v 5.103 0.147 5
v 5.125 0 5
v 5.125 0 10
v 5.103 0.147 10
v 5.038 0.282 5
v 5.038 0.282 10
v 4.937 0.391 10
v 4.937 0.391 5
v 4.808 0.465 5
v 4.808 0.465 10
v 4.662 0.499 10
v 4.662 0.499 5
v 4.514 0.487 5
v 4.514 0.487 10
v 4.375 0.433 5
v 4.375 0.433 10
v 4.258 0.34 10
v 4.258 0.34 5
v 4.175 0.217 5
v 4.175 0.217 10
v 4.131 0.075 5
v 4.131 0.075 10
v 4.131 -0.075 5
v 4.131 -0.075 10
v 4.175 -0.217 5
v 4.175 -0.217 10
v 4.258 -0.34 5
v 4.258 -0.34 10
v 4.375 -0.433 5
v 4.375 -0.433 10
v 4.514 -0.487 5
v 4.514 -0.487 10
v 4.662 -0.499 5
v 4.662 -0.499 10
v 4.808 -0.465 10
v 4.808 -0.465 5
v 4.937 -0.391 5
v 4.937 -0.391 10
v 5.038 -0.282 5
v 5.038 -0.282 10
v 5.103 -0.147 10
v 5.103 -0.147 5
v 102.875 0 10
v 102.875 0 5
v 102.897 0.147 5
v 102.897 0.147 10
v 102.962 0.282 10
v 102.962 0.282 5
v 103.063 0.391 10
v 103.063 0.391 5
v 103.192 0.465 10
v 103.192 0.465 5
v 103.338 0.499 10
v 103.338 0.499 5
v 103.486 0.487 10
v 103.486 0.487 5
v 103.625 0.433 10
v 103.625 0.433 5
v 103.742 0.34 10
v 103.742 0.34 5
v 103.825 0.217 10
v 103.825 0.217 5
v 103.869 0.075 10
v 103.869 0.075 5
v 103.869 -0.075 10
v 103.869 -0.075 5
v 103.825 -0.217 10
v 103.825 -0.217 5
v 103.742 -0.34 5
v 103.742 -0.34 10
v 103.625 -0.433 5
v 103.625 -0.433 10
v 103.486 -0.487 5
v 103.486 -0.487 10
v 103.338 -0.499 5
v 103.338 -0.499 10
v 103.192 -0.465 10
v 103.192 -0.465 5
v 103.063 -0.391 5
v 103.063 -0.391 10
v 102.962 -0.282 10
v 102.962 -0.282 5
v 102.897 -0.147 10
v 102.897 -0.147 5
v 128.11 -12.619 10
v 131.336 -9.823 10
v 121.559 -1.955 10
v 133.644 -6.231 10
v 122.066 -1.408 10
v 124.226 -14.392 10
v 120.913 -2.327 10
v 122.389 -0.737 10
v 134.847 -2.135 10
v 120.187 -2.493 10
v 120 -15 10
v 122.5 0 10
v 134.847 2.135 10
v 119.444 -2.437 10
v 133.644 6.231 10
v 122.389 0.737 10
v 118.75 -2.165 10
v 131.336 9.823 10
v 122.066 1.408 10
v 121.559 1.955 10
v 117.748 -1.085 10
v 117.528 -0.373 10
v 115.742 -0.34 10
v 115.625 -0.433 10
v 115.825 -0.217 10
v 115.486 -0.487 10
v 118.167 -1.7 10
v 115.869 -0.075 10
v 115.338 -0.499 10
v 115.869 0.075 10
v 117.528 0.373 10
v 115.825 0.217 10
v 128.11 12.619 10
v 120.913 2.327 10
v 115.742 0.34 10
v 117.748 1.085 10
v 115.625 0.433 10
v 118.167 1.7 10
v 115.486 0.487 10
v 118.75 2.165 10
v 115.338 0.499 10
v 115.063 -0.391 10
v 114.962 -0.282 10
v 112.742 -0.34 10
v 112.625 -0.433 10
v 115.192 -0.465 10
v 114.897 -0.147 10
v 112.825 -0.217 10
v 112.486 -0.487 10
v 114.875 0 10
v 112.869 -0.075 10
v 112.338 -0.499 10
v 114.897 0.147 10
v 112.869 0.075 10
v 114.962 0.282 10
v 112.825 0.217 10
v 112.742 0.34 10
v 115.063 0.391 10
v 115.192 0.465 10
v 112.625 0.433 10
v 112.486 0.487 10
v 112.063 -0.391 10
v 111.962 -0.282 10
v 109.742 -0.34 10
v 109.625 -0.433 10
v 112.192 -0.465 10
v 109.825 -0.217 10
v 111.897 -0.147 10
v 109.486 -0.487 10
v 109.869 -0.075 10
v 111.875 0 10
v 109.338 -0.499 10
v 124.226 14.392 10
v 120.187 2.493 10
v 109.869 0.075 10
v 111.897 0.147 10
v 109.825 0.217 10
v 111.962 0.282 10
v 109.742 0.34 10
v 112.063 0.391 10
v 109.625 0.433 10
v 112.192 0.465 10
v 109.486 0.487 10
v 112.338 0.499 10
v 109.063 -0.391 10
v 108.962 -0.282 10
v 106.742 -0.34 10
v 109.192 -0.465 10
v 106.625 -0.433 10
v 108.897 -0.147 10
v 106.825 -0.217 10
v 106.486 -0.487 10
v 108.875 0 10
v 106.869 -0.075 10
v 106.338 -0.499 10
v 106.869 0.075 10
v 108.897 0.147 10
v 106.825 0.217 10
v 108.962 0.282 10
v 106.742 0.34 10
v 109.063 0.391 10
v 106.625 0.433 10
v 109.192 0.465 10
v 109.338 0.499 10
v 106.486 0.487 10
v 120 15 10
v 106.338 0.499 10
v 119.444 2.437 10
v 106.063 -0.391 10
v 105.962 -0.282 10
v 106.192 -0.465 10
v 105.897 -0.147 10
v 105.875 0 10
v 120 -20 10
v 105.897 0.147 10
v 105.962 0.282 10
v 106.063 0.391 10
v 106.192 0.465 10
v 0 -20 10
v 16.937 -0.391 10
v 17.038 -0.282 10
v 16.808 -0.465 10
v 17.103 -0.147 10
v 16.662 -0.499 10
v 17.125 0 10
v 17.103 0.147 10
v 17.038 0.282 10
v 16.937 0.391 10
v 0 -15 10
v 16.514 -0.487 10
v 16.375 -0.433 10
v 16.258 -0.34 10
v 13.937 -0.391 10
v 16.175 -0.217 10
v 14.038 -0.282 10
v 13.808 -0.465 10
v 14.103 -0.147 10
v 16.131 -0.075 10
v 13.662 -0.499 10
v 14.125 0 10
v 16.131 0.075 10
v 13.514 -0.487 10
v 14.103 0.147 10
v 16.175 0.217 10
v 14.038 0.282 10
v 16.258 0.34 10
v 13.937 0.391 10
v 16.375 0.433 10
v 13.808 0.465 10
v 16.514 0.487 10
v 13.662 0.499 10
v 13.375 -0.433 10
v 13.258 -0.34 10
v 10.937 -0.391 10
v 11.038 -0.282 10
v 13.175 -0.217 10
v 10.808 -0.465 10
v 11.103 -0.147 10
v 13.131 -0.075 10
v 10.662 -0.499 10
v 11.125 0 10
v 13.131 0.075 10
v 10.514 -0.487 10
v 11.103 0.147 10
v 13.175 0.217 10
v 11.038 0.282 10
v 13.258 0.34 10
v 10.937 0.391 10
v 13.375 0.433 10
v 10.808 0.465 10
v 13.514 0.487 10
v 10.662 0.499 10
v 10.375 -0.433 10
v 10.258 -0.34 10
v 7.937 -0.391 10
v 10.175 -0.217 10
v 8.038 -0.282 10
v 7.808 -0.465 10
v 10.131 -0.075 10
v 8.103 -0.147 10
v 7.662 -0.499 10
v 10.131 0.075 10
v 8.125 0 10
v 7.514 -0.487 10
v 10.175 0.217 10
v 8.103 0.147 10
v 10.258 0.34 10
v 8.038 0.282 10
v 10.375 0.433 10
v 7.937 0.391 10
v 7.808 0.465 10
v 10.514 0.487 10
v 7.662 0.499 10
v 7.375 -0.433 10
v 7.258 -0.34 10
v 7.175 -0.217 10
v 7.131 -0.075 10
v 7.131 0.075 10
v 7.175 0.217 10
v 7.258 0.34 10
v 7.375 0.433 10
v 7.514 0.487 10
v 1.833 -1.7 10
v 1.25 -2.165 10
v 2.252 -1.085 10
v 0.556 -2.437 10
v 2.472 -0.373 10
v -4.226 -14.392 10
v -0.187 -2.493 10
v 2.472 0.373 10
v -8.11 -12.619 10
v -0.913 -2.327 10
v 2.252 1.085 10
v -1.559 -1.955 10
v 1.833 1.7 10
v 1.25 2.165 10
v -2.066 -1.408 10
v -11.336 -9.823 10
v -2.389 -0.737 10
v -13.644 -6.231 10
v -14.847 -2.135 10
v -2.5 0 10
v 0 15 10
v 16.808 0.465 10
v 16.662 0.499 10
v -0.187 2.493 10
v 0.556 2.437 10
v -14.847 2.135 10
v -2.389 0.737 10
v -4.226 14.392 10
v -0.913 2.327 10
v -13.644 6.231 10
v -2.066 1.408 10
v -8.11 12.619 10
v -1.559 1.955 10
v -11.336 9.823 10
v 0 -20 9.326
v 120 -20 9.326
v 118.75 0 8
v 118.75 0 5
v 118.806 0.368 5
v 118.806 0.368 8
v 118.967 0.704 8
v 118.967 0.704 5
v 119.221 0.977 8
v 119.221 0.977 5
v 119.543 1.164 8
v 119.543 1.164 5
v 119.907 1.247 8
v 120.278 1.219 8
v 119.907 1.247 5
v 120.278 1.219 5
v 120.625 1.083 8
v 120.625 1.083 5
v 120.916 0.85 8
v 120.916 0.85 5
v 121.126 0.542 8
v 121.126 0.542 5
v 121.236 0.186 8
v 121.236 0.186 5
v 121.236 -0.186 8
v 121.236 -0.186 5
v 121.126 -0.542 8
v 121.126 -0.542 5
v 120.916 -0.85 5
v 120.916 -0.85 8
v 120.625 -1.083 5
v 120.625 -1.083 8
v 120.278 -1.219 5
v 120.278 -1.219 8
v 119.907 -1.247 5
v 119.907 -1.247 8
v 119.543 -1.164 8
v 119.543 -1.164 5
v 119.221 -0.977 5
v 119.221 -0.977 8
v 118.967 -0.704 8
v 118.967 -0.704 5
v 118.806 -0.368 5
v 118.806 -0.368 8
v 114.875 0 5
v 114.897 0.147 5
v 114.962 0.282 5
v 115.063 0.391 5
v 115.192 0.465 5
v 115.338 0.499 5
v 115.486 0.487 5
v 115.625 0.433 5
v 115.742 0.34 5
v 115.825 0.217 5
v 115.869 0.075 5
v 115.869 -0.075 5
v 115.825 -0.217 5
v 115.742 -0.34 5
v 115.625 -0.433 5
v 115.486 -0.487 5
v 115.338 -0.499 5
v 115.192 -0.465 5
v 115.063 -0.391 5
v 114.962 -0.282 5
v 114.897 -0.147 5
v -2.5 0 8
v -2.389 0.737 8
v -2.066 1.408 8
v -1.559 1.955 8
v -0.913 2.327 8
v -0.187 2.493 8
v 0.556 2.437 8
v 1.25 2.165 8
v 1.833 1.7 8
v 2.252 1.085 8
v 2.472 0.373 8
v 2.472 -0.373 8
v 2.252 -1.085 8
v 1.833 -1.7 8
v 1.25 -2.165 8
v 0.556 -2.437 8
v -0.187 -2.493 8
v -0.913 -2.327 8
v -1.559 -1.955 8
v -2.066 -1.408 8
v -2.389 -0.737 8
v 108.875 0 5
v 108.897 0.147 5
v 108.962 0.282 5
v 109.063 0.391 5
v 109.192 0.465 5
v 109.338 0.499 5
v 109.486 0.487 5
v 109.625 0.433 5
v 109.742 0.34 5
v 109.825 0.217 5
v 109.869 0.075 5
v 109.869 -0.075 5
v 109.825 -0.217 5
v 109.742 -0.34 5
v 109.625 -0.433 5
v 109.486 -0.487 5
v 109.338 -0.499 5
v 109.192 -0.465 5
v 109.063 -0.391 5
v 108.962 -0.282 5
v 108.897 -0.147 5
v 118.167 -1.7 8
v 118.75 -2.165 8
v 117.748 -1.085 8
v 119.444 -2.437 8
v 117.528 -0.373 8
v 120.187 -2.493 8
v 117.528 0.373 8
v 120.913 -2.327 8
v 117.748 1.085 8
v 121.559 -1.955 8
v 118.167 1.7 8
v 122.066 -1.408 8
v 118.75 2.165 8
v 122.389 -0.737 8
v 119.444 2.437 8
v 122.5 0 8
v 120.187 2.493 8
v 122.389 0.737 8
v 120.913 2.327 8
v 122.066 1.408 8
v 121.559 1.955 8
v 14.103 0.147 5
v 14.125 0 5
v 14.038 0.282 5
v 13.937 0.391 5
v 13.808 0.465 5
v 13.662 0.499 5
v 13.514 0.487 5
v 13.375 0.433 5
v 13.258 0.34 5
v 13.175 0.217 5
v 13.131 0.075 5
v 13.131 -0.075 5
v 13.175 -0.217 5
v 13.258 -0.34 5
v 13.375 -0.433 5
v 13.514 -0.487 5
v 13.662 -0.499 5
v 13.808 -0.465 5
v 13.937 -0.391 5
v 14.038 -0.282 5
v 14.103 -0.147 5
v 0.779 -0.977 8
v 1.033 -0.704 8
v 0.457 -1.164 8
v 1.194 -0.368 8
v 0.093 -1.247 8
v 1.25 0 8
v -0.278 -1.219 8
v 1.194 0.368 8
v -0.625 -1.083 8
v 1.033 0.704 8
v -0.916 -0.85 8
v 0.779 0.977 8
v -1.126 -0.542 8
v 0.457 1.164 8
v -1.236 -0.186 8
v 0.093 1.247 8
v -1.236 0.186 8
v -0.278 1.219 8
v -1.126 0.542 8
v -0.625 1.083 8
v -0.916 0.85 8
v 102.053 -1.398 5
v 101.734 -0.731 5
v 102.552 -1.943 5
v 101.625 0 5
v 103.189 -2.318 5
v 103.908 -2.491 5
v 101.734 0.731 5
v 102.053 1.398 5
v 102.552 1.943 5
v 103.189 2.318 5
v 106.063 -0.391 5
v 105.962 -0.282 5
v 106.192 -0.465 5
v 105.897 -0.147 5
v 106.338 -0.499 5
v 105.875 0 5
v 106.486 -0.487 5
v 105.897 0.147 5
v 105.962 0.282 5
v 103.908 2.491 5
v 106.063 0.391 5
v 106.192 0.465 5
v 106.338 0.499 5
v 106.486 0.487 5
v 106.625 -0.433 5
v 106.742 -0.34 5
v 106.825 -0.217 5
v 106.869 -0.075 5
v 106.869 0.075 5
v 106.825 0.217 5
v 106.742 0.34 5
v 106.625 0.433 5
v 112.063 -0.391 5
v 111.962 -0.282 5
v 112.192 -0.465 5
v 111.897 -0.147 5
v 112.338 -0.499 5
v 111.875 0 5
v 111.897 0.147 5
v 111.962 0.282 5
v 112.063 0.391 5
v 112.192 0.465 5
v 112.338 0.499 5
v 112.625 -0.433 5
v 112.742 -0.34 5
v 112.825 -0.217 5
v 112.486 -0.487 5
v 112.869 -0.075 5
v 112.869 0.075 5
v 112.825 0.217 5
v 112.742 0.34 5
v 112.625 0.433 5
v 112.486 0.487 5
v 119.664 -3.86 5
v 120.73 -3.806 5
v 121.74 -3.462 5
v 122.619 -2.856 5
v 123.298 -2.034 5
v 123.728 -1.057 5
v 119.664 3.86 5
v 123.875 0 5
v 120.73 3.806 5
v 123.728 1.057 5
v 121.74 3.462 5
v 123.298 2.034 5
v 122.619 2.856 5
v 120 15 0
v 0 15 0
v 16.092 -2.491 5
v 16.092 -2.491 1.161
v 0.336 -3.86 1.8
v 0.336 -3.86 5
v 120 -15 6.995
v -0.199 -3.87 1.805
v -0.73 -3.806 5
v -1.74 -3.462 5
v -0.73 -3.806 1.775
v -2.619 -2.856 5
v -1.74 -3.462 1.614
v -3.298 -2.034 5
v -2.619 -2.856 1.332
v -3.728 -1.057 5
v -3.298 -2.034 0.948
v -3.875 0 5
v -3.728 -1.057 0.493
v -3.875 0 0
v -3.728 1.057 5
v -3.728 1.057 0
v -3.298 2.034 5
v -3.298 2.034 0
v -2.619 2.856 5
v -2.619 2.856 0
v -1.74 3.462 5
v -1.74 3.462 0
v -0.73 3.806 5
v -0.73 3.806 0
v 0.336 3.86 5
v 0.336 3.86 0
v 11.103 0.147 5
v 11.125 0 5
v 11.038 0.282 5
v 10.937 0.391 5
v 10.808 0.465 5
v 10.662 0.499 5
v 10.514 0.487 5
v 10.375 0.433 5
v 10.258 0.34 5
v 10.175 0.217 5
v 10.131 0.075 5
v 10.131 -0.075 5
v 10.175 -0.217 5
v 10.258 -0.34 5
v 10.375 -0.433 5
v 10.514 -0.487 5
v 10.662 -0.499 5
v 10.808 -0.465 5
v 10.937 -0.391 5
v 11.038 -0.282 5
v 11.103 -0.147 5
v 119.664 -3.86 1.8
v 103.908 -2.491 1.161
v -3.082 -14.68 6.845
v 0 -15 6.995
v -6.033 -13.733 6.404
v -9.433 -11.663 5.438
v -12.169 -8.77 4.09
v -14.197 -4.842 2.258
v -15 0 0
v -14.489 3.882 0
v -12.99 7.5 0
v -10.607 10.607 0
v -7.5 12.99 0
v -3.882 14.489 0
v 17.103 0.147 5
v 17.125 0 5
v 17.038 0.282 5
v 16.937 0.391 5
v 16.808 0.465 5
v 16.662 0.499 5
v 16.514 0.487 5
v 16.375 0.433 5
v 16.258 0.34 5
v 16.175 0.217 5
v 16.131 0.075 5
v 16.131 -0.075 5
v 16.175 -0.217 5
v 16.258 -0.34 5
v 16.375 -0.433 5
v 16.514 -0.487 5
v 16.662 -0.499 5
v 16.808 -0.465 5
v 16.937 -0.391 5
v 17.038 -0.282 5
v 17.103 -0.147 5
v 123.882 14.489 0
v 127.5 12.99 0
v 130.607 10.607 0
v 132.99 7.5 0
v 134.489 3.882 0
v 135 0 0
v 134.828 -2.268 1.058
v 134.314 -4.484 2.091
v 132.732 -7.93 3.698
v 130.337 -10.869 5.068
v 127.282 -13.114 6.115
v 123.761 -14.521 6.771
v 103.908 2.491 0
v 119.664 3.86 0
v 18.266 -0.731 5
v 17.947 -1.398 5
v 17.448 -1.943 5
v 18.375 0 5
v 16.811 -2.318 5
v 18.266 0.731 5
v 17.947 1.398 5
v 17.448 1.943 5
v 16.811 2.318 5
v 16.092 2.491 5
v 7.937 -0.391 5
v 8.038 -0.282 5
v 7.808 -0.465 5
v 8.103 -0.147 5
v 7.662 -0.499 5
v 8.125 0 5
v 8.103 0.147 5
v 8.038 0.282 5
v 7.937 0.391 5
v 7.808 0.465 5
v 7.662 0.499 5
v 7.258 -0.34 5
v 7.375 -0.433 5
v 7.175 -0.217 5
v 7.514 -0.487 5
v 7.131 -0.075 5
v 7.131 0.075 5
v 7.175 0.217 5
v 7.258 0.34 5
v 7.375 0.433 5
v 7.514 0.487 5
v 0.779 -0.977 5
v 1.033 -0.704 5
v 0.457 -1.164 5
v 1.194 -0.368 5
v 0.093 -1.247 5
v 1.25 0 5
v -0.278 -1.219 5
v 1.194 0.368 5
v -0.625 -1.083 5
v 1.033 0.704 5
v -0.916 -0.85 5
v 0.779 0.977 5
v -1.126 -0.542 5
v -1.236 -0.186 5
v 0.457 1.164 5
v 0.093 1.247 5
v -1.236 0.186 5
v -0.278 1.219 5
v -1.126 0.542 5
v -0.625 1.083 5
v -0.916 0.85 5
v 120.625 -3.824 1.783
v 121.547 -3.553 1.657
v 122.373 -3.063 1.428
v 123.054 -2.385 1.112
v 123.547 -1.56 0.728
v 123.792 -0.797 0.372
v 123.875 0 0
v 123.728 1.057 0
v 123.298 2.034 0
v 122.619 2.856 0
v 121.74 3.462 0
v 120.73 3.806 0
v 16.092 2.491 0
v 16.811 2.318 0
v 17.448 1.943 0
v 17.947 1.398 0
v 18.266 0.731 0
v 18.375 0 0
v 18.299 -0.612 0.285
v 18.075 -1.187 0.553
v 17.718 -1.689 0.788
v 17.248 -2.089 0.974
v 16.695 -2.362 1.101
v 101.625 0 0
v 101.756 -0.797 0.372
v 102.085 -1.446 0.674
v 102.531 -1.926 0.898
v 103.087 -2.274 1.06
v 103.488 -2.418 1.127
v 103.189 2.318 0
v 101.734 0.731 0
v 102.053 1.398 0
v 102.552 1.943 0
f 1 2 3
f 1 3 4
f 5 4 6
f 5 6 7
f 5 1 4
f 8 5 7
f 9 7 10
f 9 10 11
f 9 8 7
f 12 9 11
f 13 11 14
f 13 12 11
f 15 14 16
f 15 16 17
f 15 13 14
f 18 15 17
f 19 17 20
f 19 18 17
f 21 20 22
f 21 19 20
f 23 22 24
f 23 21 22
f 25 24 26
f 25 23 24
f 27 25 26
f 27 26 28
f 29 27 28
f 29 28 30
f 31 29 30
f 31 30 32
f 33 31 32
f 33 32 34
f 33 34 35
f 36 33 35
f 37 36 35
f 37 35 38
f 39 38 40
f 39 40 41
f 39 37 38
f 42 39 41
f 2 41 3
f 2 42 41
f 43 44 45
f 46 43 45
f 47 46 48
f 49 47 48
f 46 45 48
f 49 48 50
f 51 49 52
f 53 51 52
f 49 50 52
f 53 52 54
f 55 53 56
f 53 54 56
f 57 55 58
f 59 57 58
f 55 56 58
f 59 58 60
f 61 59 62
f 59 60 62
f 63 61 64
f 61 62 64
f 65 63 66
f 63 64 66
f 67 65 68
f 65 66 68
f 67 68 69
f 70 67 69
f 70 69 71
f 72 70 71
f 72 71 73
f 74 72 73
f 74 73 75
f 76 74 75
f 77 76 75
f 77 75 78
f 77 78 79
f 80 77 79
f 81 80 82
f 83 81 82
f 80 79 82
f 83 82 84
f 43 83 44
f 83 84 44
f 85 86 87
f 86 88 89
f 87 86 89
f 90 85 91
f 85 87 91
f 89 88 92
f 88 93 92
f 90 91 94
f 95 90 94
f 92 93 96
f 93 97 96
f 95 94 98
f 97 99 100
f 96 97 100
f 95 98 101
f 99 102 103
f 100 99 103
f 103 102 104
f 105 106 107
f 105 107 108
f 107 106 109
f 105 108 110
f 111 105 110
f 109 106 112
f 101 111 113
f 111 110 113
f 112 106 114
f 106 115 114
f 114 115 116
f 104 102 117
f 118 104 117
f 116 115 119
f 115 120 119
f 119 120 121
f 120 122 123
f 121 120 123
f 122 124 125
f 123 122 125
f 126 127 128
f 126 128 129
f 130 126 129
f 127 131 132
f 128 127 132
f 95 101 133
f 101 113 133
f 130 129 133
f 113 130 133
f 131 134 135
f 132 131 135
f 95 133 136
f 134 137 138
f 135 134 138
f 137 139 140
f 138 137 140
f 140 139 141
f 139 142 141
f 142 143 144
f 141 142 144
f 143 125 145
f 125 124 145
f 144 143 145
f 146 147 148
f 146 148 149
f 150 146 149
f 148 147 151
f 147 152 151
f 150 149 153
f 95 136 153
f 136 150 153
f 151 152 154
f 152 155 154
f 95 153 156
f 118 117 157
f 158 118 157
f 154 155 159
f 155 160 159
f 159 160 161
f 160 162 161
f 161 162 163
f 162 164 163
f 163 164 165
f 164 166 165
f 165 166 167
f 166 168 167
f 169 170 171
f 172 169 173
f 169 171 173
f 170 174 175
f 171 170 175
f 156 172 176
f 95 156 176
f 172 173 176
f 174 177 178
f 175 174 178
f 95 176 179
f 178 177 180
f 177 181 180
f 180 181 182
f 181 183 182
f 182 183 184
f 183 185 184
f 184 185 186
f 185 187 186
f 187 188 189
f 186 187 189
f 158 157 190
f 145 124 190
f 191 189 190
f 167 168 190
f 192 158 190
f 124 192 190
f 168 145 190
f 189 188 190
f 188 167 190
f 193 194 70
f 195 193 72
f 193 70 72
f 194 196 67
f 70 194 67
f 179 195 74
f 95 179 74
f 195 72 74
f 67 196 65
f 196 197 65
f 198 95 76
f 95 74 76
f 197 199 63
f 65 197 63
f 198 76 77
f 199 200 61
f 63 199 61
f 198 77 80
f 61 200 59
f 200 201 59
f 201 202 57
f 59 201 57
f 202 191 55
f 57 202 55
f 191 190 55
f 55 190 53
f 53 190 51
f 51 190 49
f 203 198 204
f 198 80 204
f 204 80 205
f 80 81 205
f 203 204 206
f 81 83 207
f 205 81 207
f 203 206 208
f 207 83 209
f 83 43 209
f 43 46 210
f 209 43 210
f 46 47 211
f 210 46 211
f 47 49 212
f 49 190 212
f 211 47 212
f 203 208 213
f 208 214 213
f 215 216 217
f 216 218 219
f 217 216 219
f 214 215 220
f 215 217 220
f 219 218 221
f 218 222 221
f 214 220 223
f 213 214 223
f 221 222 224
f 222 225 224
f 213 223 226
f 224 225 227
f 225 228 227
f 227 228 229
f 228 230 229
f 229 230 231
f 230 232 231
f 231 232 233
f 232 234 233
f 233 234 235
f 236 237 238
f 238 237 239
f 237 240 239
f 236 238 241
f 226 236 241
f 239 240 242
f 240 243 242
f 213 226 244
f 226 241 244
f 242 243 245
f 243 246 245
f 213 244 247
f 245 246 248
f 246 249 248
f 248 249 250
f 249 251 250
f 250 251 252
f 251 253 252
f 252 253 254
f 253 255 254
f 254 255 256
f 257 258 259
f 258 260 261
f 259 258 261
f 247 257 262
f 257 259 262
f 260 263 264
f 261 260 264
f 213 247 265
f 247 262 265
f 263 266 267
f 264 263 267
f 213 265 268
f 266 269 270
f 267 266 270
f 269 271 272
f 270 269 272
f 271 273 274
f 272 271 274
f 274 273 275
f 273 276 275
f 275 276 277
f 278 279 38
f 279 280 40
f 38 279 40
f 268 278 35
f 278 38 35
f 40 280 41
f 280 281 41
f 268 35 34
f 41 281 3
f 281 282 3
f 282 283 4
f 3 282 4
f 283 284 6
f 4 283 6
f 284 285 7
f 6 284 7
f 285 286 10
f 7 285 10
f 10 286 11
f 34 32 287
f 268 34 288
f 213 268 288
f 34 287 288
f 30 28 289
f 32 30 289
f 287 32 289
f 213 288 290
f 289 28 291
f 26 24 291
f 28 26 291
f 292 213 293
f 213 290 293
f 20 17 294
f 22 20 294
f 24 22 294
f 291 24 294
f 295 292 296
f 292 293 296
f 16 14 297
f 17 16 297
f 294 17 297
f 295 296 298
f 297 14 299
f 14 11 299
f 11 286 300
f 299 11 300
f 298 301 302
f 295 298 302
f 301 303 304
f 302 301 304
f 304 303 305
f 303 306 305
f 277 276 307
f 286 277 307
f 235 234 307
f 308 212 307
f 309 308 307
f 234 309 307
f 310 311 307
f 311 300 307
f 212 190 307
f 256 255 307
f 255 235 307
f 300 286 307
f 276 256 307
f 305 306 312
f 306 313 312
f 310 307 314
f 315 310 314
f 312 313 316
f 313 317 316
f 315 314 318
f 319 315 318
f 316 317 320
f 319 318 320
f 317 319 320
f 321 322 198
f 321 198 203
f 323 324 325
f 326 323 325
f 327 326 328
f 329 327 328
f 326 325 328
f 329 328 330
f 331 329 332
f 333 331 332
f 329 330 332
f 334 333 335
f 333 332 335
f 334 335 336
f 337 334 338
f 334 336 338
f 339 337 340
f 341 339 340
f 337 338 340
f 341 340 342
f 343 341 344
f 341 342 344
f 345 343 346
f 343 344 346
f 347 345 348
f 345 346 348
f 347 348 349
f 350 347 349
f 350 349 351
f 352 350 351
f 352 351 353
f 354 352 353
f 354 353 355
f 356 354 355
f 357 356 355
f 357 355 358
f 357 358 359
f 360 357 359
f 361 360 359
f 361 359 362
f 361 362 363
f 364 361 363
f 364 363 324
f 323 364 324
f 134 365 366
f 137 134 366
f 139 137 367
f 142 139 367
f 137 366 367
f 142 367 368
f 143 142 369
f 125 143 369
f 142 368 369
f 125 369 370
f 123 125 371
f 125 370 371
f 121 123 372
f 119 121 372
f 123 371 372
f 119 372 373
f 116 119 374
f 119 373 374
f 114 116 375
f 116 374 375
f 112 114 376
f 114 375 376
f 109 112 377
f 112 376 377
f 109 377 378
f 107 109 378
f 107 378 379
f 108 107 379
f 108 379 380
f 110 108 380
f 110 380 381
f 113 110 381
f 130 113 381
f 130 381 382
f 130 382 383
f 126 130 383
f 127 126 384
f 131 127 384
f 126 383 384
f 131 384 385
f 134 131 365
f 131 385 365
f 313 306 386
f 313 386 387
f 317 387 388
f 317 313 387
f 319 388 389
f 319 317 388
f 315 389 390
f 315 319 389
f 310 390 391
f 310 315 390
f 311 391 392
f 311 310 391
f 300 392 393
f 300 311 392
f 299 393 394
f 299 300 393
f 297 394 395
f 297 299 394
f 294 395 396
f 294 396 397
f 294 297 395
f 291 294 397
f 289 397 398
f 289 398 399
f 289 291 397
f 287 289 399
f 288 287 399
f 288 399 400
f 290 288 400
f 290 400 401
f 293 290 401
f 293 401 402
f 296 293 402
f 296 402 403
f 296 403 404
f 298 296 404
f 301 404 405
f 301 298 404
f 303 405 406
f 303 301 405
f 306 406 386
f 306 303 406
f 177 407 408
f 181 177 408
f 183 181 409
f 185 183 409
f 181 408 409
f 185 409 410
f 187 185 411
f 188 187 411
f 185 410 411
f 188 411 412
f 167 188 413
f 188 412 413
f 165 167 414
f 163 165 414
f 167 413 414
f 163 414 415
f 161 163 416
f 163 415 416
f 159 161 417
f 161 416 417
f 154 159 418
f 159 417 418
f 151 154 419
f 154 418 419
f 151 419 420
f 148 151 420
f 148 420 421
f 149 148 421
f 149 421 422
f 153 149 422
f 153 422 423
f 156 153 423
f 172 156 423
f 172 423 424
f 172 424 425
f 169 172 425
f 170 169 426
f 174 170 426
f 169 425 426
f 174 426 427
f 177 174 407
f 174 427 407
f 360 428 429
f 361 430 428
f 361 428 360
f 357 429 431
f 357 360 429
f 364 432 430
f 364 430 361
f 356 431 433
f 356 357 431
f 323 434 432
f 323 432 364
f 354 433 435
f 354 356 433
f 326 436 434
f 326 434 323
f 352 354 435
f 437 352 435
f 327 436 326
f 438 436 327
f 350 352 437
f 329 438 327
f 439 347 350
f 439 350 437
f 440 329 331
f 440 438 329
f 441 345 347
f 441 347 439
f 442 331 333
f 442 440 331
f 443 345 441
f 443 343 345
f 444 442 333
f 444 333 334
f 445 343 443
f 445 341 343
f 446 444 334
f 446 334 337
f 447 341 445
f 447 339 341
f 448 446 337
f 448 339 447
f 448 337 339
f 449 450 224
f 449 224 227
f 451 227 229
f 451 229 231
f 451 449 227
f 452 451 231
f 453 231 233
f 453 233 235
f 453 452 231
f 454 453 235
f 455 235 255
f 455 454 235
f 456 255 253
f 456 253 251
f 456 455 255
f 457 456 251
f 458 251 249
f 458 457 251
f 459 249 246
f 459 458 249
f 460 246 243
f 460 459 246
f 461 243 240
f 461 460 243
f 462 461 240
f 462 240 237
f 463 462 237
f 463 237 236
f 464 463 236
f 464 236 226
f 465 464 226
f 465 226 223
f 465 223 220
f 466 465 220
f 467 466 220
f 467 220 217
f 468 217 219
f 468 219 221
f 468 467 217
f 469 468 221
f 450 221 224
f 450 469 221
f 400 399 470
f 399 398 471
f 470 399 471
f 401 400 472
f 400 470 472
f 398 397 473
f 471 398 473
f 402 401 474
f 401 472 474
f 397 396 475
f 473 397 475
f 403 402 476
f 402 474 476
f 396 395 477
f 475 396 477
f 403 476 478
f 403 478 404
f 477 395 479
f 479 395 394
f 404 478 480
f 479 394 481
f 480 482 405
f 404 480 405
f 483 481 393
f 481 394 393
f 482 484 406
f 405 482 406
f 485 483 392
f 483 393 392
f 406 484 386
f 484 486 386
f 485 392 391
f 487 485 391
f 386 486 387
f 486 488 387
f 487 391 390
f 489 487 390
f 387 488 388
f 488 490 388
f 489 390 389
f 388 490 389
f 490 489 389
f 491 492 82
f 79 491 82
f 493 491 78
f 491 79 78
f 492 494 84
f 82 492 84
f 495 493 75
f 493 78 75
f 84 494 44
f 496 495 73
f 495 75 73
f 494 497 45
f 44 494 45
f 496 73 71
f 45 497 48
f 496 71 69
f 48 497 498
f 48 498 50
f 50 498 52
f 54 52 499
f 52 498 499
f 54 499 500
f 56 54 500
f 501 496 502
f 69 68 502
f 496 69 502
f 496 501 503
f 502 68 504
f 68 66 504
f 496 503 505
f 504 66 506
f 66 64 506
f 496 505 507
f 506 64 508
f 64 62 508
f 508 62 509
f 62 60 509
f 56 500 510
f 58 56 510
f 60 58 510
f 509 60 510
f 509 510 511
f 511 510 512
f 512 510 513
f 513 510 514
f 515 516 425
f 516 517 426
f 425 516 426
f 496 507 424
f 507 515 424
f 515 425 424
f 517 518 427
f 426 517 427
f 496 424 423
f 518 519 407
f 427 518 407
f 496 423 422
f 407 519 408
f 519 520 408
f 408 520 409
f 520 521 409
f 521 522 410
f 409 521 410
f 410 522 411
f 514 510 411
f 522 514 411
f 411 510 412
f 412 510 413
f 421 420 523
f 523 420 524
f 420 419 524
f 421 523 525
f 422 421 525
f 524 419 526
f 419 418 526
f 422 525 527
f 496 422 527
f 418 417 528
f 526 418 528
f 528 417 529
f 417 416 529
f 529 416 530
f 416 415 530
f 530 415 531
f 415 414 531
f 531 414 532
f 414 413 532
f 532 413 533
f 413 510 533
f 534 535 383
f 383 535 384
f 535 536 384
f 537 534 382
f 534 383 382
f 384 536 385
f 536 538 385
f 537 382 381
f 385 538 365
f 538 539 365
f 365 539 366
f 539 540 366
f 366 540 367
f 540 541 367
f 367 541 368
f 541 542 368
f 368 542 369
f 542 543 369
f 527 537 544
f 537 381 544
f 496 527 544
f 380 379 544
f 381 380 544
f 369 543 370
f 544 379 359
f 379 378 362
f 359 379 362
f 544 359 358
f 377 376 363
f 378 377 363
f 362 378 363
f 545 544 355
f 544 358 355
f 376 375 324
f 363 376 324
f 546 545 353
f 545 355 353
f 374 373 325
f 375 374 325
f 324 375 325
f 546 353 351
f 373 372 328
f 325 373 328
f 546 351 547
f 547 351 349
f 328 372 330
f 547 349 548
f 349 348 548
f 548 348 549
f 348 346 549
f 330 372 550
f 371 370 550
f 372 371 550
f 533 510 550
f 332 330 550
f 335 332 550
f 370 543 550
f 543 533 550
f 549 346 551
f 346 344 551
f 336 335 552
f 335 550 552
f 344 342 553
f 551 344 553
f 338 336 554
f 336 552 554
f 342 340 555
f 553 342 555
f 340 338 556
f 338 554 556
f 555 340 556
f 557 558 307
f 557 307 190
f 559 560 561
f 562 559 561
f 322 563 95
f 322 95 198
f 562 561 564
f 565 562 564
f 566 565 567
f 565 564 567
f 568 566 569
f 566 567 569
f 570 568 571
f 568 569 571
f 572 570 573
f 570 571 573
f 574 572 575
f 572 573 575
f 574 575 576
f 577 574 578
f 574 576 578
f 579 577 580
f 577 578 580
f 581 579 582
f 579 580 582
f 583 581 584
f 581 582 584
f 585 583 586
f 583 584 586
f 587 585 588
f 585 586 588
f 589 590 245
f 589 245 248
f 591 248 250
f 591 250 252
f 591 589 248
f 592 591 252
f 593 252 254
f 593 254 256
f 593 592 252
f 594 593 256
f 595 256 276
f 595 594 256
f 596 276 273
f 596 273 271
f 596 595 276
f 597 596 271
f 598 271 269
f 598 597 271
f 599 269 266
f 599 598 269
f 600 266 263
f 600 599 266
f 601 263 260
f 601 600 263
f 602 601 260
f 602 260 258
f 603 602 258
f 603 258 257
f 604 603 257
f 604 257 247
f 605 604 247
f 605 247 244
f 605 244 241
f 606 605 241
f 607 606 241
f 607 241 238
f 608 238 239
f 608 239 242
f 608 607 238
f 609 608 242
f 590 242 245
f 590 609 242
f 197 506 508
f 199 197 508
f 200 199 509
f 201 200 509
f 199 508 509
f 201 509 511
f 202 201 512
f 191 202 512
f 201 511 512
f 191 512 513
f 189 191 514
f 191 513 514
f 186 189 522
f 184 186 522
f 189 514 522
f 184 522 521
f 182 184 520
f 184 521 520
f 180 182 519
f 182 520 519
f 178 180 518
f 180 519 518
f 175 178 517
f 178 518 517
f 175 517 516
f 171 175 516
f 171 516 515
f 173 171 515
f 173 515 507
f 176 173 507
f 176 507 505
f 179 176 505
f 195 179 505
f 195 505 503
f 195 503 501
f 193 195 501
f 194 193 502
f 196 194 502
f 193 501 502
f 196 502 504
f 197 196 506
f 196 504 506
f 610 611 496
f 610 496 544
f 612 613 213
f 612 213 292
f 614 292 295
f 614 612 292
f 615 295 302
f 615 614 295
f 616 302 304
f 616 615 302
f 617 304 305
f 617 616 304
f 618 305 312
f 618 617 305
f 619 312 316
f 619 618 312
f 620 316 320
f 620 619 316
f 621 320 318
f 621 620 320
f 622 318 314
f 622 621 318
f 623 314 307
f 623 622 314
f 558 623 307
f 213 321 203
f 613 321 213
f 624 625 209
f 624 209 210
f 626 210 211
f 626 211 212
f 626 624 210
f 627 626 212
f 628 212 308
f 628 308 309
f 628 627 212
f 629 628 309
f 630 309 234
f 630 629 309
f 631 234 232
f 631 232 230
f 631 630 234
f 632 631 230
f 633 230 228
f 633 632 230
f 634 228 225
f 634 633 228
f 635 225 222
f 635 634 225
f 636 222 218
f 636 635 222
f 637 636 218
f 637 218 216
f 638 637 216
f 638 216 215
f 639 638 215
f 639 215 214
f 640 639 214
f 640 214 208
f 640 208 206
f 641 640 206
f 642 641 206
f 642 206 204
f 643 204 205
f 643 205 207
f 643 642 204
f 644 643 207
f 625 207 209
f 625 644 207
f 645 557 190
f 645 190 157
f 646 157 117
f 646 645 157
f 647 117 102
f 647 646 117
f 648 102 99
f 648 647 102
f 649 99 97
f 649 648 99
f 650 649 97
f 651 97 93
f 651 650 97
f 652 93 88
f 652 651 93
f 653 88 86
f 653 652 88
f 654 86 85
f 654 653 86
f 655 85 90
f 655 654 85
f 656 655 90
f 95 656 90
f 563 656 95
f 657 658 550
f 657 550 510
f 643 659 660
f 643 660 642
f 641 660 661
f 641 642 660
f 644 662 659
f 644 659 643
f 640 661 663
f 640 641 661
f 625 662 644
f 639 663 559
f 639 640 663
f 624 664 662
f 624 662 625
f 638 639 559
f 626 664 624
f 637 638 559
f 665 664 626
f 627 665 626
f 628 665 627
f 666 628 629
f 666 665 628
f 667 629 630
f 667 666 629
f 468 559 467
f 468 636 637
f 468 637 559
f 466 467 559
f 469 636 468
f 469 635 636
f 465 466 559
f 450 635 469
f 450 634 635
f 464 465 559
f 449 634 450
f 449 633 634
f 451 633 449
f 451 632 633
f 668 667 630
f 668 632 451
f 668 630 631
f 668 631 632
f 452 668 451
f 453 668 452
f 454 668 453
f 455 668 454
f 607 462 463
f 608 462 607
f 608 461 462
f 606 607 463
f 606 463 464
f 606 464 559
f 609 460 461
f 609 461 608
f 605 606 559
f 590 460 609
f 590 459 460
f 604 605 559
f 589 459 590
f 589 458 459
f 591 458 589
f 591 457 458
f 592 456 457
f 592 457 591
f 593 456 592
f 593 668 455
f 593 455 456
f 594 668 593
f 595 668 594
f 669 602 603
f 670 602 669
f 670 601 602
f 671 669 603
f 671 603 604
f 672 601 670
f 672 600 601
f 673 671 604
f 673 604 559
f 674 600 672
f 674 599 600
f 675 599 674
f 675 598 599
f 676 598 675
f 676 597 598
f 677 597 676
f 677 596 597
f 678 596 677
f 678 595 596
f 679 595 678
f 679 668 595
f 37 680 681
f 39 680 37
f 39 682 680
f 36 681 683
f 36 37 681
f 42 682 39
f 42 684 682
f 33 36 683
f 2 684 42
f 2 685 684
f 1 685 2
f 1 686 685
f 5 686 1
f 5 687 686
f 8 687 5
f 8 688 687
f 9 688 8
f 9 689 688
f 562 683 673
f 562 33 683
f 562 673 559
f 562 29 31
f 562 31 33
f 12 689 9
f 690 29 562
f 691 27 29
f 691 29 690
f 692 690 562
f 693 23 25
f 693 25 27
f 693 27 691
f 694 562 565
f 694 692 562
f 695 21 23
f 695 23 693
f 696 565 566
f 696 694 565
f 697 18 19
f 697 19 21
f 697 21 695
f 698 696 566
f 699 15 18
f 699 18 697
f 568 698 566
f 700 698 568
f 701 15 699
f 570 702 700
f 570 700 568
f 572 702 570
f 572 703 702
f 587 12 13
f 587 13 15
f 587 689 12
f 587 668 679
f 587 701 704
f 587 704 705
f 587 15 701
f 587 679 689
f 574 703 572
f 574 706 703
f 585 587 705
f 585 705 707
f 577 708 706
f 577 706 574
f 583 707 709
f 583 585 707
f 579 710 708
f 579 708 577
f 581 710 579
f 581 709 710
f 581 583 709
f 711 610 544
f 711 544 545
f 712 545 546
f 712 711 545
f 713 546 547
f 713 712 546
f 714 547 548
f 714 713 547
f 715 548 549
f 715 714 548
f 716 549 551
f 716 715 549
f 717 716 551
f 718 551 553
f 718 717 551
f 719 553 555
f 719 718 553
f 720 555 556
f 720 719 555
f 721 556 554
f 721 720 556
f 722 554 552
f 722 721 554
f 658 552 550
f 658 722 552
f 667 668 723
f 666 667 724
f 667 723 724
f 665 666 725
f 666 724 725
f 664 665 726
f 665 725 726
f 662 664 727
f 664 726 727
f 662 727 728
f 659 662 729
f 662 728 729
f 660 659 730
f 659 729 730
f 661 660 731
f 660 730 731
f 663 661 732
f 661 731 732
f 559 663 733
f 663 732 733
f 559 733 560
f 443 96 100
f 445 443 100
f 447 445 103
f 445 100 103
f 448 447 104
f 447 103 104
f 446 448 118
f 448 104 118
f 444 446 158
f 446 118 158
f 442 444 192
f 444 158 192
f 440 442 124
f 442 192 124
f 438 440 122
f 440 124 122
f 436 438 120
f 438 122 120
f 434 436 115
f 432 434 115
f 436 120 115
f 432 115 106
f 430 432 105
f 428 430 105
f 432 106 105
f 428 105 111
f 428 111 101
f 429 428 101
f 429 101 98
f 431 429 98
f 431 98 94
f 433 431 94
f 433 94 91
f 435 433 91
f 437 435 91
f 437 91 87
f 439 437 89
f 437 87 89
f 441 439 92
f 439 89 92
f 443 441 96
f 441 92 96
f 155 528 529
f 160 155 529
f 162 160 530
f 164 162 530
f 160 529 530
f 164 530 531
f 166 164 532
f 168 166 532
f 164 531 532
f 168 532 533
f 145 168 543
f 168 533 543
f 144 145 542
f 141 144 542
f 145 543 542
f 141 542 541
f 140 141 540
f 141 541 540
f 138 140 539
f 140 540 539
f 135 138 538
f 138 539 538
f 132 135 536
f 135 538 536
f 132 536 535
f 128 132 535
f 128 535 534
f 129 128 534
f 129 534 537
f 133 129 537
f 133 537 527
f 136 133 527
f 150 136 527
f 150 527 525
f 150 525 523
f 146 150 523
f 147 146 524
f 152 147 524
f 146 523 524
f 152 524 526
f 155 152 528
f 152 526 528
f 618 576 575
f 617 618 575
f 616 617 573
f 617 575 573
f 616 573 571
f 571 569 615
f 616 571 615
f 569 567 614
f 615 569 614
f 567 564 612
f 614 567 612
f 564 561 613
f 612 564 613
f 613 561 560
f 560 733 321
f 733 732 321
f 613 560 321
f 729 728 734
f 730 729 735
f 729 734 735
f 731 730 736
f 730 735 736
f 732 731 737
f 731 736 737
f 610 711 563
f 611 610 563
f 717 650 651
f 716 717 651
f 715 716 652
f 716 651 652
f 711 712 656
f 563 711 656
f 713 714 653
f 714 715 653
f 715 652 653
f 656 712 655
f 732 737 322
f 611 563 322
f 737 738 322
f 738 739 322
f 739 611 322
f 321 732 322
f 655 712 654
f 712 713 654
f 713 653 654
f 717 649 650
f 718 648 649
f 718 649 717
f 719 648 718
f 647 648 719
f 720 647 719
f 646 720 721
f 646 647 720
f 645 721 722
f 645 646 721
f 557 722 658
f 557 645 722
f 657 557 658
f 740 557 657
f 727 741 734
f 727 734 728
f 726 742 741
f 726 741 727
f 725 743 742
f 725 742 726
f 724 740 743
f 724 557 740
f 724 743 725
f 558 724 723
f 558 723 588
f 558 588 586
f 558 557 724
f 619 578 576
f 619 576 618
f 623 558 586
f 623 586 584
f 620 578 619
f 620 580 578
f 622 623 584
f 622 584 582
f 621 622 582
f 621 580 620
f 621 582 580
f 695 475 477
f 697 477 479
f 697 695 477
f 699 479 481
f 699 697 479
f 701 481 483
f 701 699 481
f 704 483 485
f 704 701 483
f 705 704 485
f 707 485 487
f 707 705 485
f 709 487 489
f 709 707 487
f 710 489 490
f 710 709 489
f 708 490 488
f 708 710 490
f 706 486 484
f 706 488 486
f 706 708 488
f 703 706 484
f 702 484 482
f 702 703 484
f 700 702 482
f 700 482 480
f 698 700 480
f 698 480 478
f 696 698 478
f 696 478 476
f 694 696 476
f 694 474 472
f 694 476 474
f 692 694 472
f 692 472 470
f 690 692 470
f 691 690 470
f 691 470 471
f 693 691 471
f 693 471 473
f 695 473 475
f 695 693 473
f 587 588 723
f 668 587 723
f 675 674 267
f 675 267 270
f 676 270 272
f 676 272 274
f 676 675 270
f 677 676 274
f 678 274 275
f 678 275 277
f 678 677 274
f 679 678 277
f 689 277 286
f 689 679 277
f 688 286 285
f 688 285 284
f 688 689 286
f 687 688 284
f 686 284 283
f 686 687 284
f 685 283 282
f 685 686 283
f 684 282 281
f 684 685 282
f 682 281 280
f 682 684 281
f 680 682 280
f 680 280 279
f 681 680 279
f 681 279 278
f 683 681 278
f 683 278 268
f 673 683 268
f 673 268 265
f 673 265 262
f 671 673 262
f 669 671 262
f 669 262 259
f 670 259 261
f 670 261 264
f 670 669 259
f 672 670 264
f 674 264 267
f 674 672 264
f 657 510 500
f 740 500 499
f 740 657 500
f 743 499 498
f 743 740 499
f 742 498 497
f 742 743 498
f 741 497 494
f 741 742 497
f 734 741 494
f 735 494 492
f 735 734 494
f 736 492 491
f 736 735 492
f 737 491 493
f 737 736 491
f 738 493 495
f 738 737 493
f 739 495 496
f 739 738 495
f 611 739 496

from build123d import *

# Parameters (mm, degrees)
BOSS_EXTRUDE1_DEPTH = 10
CUT_EXTRUDE1_DEPTH  = 5
SKETCH3_R           = 0.5
SKETCH3_R_2         = 1.25
CUT_EXTRUDE2_DEPTH  = 5
SKETCH5_R           = 2.5
CUT_EXTRUDE3_DEPTH  = 2
CHAMFER1_SIZE       = 20
CHAMFER1_SIZE_2     = 9.326153163


with BuildPart() as part:
    # Sketch1 → Boss-Extrude1 (new body)
    with BuildSketch(Plane.XY):
        with BuildLine():
            Line((0, 15), (120, 15))
            ThreePointArc((120, 15), (135, 0), (120, -15))
            Line((120, -15), (120, -20))
            Line((120, -20), (0, -20))
            Line((0, -20), (0, -15))
            ThreePointArc((0, -15), (-15, 0), (0, 15))
        make_face()
    extrude(amount=BOSS_EXTRUDE1_DEPTH)

    # Sketch2 → Cut-Extrude1 (cut)
    with BuildSketch(Plane(origin=(0, 0, 0), x_dir=(-1, 0, 0), z_dir=(0, 0, -1))):
        with BuildLine():
            Line((-119.664370079, 3.860437482), (-103.908464567, 2.490604827))
            ThreePointArc((-103.908464567, 2.490604827), (-101.625, 0), (-103.908464567, -2.490604827))
            Line((-103.908464567, -2.490604827), (-119.664370079, -3.860437482))
            ThreePointArc((-119.664370079, -3.860437482), (-123.875, 0), (-119.664370079, 3.860437482))
        make_face()
    cut_extrude1 = extrude(amount=-CUT_EXTRUDE1_DEPTH, mode=Mode.SUBTRACT)

    # Sketch3 → Cut-Extrude2 (cut)
    with BuildSketch(Plane(origin=(0, 0, 5), x_dir=(-1, 0, 0), z_dir=(0, 0, -1))):
        with Locations((-115.375, 0)):
            Circle(SKETCH3_R)
        with Locations((-112.375, 0)):
            Circle(SKETCH3_R)
        with Locations((-109.375, 0)):
            Circle(SKETCH3_R)
        with Locations((-106.375, 0)):
            Circle(SKETCH3_R)
        with Locations((-103.375, 0)):
            Circle(SKETCH3_R)
        with Locations((-120, 0)):
            Circle(SKETCH3_R_2)
    cut_extrude2 = extrude(amount=-CUT_EXTRUDE2_DEPTH, mode=Mode.SUBTRACT)

    # Sketch5 → Cut-Extrude3 (cut)
    with BuildSketch(Plane.XY.offset(10)):
        with Locations((120, 0)):
            Circle(SKETCH5_R)
    cut_extrude3 = extrude(amount=-CUT_EXTRUDE3_DEPTH, mode=Mode.SUBTRACT)

    # Mirror1: Cut-Extrude1, Cut-Extrude2, Cut-Extrude3 across plane
    add(cut_extrude1.mirror(Plane(origin=(60, 0, 0), x_dir=(0, 0, 1), z_dir=(1, 0, 0))), mode=Mode.SUBTRACT)
    add(cut_extrude2.mirror(Plane(origin=(60, 0, 0), x_dir=(0, 0, 1), z_dir=(1, 0, 0))), mode=Mode.SUBTRACT)
    add(cut_extrude3.mirror(Plane(origin=(60, 0, 0), x_dir=(0, 0, 1), z_dir=(1, 0, 0))), mode=Mode.SUBTRACT)

    # Chamfer1
    # the kernel refuses this chamfer: 20, 9.326153163 mm, written as the material it takes off along each edge
    with BuildSketch(Plane(origin=(171.819509428, -20, 0), x_dir=(0, 0.9998669641130704, -0.016311164131110348), z_dir=(-1, 0, 0))) as chamfer1_piece_1:
        Polygon((CHAMFER1_SIZE * 0.999866964113, -CHAMFER1_SIZE * 0.0163111641311), (-CHAMFER1_SIZE_2 * 0.0163111641313, -CHAMFER1_SIZE_2 * 0.999866964124), (0, 0), align=None)
    extrude(amount=223.639018857, mode=Mode.SUBTRACT)


solid = part.part
